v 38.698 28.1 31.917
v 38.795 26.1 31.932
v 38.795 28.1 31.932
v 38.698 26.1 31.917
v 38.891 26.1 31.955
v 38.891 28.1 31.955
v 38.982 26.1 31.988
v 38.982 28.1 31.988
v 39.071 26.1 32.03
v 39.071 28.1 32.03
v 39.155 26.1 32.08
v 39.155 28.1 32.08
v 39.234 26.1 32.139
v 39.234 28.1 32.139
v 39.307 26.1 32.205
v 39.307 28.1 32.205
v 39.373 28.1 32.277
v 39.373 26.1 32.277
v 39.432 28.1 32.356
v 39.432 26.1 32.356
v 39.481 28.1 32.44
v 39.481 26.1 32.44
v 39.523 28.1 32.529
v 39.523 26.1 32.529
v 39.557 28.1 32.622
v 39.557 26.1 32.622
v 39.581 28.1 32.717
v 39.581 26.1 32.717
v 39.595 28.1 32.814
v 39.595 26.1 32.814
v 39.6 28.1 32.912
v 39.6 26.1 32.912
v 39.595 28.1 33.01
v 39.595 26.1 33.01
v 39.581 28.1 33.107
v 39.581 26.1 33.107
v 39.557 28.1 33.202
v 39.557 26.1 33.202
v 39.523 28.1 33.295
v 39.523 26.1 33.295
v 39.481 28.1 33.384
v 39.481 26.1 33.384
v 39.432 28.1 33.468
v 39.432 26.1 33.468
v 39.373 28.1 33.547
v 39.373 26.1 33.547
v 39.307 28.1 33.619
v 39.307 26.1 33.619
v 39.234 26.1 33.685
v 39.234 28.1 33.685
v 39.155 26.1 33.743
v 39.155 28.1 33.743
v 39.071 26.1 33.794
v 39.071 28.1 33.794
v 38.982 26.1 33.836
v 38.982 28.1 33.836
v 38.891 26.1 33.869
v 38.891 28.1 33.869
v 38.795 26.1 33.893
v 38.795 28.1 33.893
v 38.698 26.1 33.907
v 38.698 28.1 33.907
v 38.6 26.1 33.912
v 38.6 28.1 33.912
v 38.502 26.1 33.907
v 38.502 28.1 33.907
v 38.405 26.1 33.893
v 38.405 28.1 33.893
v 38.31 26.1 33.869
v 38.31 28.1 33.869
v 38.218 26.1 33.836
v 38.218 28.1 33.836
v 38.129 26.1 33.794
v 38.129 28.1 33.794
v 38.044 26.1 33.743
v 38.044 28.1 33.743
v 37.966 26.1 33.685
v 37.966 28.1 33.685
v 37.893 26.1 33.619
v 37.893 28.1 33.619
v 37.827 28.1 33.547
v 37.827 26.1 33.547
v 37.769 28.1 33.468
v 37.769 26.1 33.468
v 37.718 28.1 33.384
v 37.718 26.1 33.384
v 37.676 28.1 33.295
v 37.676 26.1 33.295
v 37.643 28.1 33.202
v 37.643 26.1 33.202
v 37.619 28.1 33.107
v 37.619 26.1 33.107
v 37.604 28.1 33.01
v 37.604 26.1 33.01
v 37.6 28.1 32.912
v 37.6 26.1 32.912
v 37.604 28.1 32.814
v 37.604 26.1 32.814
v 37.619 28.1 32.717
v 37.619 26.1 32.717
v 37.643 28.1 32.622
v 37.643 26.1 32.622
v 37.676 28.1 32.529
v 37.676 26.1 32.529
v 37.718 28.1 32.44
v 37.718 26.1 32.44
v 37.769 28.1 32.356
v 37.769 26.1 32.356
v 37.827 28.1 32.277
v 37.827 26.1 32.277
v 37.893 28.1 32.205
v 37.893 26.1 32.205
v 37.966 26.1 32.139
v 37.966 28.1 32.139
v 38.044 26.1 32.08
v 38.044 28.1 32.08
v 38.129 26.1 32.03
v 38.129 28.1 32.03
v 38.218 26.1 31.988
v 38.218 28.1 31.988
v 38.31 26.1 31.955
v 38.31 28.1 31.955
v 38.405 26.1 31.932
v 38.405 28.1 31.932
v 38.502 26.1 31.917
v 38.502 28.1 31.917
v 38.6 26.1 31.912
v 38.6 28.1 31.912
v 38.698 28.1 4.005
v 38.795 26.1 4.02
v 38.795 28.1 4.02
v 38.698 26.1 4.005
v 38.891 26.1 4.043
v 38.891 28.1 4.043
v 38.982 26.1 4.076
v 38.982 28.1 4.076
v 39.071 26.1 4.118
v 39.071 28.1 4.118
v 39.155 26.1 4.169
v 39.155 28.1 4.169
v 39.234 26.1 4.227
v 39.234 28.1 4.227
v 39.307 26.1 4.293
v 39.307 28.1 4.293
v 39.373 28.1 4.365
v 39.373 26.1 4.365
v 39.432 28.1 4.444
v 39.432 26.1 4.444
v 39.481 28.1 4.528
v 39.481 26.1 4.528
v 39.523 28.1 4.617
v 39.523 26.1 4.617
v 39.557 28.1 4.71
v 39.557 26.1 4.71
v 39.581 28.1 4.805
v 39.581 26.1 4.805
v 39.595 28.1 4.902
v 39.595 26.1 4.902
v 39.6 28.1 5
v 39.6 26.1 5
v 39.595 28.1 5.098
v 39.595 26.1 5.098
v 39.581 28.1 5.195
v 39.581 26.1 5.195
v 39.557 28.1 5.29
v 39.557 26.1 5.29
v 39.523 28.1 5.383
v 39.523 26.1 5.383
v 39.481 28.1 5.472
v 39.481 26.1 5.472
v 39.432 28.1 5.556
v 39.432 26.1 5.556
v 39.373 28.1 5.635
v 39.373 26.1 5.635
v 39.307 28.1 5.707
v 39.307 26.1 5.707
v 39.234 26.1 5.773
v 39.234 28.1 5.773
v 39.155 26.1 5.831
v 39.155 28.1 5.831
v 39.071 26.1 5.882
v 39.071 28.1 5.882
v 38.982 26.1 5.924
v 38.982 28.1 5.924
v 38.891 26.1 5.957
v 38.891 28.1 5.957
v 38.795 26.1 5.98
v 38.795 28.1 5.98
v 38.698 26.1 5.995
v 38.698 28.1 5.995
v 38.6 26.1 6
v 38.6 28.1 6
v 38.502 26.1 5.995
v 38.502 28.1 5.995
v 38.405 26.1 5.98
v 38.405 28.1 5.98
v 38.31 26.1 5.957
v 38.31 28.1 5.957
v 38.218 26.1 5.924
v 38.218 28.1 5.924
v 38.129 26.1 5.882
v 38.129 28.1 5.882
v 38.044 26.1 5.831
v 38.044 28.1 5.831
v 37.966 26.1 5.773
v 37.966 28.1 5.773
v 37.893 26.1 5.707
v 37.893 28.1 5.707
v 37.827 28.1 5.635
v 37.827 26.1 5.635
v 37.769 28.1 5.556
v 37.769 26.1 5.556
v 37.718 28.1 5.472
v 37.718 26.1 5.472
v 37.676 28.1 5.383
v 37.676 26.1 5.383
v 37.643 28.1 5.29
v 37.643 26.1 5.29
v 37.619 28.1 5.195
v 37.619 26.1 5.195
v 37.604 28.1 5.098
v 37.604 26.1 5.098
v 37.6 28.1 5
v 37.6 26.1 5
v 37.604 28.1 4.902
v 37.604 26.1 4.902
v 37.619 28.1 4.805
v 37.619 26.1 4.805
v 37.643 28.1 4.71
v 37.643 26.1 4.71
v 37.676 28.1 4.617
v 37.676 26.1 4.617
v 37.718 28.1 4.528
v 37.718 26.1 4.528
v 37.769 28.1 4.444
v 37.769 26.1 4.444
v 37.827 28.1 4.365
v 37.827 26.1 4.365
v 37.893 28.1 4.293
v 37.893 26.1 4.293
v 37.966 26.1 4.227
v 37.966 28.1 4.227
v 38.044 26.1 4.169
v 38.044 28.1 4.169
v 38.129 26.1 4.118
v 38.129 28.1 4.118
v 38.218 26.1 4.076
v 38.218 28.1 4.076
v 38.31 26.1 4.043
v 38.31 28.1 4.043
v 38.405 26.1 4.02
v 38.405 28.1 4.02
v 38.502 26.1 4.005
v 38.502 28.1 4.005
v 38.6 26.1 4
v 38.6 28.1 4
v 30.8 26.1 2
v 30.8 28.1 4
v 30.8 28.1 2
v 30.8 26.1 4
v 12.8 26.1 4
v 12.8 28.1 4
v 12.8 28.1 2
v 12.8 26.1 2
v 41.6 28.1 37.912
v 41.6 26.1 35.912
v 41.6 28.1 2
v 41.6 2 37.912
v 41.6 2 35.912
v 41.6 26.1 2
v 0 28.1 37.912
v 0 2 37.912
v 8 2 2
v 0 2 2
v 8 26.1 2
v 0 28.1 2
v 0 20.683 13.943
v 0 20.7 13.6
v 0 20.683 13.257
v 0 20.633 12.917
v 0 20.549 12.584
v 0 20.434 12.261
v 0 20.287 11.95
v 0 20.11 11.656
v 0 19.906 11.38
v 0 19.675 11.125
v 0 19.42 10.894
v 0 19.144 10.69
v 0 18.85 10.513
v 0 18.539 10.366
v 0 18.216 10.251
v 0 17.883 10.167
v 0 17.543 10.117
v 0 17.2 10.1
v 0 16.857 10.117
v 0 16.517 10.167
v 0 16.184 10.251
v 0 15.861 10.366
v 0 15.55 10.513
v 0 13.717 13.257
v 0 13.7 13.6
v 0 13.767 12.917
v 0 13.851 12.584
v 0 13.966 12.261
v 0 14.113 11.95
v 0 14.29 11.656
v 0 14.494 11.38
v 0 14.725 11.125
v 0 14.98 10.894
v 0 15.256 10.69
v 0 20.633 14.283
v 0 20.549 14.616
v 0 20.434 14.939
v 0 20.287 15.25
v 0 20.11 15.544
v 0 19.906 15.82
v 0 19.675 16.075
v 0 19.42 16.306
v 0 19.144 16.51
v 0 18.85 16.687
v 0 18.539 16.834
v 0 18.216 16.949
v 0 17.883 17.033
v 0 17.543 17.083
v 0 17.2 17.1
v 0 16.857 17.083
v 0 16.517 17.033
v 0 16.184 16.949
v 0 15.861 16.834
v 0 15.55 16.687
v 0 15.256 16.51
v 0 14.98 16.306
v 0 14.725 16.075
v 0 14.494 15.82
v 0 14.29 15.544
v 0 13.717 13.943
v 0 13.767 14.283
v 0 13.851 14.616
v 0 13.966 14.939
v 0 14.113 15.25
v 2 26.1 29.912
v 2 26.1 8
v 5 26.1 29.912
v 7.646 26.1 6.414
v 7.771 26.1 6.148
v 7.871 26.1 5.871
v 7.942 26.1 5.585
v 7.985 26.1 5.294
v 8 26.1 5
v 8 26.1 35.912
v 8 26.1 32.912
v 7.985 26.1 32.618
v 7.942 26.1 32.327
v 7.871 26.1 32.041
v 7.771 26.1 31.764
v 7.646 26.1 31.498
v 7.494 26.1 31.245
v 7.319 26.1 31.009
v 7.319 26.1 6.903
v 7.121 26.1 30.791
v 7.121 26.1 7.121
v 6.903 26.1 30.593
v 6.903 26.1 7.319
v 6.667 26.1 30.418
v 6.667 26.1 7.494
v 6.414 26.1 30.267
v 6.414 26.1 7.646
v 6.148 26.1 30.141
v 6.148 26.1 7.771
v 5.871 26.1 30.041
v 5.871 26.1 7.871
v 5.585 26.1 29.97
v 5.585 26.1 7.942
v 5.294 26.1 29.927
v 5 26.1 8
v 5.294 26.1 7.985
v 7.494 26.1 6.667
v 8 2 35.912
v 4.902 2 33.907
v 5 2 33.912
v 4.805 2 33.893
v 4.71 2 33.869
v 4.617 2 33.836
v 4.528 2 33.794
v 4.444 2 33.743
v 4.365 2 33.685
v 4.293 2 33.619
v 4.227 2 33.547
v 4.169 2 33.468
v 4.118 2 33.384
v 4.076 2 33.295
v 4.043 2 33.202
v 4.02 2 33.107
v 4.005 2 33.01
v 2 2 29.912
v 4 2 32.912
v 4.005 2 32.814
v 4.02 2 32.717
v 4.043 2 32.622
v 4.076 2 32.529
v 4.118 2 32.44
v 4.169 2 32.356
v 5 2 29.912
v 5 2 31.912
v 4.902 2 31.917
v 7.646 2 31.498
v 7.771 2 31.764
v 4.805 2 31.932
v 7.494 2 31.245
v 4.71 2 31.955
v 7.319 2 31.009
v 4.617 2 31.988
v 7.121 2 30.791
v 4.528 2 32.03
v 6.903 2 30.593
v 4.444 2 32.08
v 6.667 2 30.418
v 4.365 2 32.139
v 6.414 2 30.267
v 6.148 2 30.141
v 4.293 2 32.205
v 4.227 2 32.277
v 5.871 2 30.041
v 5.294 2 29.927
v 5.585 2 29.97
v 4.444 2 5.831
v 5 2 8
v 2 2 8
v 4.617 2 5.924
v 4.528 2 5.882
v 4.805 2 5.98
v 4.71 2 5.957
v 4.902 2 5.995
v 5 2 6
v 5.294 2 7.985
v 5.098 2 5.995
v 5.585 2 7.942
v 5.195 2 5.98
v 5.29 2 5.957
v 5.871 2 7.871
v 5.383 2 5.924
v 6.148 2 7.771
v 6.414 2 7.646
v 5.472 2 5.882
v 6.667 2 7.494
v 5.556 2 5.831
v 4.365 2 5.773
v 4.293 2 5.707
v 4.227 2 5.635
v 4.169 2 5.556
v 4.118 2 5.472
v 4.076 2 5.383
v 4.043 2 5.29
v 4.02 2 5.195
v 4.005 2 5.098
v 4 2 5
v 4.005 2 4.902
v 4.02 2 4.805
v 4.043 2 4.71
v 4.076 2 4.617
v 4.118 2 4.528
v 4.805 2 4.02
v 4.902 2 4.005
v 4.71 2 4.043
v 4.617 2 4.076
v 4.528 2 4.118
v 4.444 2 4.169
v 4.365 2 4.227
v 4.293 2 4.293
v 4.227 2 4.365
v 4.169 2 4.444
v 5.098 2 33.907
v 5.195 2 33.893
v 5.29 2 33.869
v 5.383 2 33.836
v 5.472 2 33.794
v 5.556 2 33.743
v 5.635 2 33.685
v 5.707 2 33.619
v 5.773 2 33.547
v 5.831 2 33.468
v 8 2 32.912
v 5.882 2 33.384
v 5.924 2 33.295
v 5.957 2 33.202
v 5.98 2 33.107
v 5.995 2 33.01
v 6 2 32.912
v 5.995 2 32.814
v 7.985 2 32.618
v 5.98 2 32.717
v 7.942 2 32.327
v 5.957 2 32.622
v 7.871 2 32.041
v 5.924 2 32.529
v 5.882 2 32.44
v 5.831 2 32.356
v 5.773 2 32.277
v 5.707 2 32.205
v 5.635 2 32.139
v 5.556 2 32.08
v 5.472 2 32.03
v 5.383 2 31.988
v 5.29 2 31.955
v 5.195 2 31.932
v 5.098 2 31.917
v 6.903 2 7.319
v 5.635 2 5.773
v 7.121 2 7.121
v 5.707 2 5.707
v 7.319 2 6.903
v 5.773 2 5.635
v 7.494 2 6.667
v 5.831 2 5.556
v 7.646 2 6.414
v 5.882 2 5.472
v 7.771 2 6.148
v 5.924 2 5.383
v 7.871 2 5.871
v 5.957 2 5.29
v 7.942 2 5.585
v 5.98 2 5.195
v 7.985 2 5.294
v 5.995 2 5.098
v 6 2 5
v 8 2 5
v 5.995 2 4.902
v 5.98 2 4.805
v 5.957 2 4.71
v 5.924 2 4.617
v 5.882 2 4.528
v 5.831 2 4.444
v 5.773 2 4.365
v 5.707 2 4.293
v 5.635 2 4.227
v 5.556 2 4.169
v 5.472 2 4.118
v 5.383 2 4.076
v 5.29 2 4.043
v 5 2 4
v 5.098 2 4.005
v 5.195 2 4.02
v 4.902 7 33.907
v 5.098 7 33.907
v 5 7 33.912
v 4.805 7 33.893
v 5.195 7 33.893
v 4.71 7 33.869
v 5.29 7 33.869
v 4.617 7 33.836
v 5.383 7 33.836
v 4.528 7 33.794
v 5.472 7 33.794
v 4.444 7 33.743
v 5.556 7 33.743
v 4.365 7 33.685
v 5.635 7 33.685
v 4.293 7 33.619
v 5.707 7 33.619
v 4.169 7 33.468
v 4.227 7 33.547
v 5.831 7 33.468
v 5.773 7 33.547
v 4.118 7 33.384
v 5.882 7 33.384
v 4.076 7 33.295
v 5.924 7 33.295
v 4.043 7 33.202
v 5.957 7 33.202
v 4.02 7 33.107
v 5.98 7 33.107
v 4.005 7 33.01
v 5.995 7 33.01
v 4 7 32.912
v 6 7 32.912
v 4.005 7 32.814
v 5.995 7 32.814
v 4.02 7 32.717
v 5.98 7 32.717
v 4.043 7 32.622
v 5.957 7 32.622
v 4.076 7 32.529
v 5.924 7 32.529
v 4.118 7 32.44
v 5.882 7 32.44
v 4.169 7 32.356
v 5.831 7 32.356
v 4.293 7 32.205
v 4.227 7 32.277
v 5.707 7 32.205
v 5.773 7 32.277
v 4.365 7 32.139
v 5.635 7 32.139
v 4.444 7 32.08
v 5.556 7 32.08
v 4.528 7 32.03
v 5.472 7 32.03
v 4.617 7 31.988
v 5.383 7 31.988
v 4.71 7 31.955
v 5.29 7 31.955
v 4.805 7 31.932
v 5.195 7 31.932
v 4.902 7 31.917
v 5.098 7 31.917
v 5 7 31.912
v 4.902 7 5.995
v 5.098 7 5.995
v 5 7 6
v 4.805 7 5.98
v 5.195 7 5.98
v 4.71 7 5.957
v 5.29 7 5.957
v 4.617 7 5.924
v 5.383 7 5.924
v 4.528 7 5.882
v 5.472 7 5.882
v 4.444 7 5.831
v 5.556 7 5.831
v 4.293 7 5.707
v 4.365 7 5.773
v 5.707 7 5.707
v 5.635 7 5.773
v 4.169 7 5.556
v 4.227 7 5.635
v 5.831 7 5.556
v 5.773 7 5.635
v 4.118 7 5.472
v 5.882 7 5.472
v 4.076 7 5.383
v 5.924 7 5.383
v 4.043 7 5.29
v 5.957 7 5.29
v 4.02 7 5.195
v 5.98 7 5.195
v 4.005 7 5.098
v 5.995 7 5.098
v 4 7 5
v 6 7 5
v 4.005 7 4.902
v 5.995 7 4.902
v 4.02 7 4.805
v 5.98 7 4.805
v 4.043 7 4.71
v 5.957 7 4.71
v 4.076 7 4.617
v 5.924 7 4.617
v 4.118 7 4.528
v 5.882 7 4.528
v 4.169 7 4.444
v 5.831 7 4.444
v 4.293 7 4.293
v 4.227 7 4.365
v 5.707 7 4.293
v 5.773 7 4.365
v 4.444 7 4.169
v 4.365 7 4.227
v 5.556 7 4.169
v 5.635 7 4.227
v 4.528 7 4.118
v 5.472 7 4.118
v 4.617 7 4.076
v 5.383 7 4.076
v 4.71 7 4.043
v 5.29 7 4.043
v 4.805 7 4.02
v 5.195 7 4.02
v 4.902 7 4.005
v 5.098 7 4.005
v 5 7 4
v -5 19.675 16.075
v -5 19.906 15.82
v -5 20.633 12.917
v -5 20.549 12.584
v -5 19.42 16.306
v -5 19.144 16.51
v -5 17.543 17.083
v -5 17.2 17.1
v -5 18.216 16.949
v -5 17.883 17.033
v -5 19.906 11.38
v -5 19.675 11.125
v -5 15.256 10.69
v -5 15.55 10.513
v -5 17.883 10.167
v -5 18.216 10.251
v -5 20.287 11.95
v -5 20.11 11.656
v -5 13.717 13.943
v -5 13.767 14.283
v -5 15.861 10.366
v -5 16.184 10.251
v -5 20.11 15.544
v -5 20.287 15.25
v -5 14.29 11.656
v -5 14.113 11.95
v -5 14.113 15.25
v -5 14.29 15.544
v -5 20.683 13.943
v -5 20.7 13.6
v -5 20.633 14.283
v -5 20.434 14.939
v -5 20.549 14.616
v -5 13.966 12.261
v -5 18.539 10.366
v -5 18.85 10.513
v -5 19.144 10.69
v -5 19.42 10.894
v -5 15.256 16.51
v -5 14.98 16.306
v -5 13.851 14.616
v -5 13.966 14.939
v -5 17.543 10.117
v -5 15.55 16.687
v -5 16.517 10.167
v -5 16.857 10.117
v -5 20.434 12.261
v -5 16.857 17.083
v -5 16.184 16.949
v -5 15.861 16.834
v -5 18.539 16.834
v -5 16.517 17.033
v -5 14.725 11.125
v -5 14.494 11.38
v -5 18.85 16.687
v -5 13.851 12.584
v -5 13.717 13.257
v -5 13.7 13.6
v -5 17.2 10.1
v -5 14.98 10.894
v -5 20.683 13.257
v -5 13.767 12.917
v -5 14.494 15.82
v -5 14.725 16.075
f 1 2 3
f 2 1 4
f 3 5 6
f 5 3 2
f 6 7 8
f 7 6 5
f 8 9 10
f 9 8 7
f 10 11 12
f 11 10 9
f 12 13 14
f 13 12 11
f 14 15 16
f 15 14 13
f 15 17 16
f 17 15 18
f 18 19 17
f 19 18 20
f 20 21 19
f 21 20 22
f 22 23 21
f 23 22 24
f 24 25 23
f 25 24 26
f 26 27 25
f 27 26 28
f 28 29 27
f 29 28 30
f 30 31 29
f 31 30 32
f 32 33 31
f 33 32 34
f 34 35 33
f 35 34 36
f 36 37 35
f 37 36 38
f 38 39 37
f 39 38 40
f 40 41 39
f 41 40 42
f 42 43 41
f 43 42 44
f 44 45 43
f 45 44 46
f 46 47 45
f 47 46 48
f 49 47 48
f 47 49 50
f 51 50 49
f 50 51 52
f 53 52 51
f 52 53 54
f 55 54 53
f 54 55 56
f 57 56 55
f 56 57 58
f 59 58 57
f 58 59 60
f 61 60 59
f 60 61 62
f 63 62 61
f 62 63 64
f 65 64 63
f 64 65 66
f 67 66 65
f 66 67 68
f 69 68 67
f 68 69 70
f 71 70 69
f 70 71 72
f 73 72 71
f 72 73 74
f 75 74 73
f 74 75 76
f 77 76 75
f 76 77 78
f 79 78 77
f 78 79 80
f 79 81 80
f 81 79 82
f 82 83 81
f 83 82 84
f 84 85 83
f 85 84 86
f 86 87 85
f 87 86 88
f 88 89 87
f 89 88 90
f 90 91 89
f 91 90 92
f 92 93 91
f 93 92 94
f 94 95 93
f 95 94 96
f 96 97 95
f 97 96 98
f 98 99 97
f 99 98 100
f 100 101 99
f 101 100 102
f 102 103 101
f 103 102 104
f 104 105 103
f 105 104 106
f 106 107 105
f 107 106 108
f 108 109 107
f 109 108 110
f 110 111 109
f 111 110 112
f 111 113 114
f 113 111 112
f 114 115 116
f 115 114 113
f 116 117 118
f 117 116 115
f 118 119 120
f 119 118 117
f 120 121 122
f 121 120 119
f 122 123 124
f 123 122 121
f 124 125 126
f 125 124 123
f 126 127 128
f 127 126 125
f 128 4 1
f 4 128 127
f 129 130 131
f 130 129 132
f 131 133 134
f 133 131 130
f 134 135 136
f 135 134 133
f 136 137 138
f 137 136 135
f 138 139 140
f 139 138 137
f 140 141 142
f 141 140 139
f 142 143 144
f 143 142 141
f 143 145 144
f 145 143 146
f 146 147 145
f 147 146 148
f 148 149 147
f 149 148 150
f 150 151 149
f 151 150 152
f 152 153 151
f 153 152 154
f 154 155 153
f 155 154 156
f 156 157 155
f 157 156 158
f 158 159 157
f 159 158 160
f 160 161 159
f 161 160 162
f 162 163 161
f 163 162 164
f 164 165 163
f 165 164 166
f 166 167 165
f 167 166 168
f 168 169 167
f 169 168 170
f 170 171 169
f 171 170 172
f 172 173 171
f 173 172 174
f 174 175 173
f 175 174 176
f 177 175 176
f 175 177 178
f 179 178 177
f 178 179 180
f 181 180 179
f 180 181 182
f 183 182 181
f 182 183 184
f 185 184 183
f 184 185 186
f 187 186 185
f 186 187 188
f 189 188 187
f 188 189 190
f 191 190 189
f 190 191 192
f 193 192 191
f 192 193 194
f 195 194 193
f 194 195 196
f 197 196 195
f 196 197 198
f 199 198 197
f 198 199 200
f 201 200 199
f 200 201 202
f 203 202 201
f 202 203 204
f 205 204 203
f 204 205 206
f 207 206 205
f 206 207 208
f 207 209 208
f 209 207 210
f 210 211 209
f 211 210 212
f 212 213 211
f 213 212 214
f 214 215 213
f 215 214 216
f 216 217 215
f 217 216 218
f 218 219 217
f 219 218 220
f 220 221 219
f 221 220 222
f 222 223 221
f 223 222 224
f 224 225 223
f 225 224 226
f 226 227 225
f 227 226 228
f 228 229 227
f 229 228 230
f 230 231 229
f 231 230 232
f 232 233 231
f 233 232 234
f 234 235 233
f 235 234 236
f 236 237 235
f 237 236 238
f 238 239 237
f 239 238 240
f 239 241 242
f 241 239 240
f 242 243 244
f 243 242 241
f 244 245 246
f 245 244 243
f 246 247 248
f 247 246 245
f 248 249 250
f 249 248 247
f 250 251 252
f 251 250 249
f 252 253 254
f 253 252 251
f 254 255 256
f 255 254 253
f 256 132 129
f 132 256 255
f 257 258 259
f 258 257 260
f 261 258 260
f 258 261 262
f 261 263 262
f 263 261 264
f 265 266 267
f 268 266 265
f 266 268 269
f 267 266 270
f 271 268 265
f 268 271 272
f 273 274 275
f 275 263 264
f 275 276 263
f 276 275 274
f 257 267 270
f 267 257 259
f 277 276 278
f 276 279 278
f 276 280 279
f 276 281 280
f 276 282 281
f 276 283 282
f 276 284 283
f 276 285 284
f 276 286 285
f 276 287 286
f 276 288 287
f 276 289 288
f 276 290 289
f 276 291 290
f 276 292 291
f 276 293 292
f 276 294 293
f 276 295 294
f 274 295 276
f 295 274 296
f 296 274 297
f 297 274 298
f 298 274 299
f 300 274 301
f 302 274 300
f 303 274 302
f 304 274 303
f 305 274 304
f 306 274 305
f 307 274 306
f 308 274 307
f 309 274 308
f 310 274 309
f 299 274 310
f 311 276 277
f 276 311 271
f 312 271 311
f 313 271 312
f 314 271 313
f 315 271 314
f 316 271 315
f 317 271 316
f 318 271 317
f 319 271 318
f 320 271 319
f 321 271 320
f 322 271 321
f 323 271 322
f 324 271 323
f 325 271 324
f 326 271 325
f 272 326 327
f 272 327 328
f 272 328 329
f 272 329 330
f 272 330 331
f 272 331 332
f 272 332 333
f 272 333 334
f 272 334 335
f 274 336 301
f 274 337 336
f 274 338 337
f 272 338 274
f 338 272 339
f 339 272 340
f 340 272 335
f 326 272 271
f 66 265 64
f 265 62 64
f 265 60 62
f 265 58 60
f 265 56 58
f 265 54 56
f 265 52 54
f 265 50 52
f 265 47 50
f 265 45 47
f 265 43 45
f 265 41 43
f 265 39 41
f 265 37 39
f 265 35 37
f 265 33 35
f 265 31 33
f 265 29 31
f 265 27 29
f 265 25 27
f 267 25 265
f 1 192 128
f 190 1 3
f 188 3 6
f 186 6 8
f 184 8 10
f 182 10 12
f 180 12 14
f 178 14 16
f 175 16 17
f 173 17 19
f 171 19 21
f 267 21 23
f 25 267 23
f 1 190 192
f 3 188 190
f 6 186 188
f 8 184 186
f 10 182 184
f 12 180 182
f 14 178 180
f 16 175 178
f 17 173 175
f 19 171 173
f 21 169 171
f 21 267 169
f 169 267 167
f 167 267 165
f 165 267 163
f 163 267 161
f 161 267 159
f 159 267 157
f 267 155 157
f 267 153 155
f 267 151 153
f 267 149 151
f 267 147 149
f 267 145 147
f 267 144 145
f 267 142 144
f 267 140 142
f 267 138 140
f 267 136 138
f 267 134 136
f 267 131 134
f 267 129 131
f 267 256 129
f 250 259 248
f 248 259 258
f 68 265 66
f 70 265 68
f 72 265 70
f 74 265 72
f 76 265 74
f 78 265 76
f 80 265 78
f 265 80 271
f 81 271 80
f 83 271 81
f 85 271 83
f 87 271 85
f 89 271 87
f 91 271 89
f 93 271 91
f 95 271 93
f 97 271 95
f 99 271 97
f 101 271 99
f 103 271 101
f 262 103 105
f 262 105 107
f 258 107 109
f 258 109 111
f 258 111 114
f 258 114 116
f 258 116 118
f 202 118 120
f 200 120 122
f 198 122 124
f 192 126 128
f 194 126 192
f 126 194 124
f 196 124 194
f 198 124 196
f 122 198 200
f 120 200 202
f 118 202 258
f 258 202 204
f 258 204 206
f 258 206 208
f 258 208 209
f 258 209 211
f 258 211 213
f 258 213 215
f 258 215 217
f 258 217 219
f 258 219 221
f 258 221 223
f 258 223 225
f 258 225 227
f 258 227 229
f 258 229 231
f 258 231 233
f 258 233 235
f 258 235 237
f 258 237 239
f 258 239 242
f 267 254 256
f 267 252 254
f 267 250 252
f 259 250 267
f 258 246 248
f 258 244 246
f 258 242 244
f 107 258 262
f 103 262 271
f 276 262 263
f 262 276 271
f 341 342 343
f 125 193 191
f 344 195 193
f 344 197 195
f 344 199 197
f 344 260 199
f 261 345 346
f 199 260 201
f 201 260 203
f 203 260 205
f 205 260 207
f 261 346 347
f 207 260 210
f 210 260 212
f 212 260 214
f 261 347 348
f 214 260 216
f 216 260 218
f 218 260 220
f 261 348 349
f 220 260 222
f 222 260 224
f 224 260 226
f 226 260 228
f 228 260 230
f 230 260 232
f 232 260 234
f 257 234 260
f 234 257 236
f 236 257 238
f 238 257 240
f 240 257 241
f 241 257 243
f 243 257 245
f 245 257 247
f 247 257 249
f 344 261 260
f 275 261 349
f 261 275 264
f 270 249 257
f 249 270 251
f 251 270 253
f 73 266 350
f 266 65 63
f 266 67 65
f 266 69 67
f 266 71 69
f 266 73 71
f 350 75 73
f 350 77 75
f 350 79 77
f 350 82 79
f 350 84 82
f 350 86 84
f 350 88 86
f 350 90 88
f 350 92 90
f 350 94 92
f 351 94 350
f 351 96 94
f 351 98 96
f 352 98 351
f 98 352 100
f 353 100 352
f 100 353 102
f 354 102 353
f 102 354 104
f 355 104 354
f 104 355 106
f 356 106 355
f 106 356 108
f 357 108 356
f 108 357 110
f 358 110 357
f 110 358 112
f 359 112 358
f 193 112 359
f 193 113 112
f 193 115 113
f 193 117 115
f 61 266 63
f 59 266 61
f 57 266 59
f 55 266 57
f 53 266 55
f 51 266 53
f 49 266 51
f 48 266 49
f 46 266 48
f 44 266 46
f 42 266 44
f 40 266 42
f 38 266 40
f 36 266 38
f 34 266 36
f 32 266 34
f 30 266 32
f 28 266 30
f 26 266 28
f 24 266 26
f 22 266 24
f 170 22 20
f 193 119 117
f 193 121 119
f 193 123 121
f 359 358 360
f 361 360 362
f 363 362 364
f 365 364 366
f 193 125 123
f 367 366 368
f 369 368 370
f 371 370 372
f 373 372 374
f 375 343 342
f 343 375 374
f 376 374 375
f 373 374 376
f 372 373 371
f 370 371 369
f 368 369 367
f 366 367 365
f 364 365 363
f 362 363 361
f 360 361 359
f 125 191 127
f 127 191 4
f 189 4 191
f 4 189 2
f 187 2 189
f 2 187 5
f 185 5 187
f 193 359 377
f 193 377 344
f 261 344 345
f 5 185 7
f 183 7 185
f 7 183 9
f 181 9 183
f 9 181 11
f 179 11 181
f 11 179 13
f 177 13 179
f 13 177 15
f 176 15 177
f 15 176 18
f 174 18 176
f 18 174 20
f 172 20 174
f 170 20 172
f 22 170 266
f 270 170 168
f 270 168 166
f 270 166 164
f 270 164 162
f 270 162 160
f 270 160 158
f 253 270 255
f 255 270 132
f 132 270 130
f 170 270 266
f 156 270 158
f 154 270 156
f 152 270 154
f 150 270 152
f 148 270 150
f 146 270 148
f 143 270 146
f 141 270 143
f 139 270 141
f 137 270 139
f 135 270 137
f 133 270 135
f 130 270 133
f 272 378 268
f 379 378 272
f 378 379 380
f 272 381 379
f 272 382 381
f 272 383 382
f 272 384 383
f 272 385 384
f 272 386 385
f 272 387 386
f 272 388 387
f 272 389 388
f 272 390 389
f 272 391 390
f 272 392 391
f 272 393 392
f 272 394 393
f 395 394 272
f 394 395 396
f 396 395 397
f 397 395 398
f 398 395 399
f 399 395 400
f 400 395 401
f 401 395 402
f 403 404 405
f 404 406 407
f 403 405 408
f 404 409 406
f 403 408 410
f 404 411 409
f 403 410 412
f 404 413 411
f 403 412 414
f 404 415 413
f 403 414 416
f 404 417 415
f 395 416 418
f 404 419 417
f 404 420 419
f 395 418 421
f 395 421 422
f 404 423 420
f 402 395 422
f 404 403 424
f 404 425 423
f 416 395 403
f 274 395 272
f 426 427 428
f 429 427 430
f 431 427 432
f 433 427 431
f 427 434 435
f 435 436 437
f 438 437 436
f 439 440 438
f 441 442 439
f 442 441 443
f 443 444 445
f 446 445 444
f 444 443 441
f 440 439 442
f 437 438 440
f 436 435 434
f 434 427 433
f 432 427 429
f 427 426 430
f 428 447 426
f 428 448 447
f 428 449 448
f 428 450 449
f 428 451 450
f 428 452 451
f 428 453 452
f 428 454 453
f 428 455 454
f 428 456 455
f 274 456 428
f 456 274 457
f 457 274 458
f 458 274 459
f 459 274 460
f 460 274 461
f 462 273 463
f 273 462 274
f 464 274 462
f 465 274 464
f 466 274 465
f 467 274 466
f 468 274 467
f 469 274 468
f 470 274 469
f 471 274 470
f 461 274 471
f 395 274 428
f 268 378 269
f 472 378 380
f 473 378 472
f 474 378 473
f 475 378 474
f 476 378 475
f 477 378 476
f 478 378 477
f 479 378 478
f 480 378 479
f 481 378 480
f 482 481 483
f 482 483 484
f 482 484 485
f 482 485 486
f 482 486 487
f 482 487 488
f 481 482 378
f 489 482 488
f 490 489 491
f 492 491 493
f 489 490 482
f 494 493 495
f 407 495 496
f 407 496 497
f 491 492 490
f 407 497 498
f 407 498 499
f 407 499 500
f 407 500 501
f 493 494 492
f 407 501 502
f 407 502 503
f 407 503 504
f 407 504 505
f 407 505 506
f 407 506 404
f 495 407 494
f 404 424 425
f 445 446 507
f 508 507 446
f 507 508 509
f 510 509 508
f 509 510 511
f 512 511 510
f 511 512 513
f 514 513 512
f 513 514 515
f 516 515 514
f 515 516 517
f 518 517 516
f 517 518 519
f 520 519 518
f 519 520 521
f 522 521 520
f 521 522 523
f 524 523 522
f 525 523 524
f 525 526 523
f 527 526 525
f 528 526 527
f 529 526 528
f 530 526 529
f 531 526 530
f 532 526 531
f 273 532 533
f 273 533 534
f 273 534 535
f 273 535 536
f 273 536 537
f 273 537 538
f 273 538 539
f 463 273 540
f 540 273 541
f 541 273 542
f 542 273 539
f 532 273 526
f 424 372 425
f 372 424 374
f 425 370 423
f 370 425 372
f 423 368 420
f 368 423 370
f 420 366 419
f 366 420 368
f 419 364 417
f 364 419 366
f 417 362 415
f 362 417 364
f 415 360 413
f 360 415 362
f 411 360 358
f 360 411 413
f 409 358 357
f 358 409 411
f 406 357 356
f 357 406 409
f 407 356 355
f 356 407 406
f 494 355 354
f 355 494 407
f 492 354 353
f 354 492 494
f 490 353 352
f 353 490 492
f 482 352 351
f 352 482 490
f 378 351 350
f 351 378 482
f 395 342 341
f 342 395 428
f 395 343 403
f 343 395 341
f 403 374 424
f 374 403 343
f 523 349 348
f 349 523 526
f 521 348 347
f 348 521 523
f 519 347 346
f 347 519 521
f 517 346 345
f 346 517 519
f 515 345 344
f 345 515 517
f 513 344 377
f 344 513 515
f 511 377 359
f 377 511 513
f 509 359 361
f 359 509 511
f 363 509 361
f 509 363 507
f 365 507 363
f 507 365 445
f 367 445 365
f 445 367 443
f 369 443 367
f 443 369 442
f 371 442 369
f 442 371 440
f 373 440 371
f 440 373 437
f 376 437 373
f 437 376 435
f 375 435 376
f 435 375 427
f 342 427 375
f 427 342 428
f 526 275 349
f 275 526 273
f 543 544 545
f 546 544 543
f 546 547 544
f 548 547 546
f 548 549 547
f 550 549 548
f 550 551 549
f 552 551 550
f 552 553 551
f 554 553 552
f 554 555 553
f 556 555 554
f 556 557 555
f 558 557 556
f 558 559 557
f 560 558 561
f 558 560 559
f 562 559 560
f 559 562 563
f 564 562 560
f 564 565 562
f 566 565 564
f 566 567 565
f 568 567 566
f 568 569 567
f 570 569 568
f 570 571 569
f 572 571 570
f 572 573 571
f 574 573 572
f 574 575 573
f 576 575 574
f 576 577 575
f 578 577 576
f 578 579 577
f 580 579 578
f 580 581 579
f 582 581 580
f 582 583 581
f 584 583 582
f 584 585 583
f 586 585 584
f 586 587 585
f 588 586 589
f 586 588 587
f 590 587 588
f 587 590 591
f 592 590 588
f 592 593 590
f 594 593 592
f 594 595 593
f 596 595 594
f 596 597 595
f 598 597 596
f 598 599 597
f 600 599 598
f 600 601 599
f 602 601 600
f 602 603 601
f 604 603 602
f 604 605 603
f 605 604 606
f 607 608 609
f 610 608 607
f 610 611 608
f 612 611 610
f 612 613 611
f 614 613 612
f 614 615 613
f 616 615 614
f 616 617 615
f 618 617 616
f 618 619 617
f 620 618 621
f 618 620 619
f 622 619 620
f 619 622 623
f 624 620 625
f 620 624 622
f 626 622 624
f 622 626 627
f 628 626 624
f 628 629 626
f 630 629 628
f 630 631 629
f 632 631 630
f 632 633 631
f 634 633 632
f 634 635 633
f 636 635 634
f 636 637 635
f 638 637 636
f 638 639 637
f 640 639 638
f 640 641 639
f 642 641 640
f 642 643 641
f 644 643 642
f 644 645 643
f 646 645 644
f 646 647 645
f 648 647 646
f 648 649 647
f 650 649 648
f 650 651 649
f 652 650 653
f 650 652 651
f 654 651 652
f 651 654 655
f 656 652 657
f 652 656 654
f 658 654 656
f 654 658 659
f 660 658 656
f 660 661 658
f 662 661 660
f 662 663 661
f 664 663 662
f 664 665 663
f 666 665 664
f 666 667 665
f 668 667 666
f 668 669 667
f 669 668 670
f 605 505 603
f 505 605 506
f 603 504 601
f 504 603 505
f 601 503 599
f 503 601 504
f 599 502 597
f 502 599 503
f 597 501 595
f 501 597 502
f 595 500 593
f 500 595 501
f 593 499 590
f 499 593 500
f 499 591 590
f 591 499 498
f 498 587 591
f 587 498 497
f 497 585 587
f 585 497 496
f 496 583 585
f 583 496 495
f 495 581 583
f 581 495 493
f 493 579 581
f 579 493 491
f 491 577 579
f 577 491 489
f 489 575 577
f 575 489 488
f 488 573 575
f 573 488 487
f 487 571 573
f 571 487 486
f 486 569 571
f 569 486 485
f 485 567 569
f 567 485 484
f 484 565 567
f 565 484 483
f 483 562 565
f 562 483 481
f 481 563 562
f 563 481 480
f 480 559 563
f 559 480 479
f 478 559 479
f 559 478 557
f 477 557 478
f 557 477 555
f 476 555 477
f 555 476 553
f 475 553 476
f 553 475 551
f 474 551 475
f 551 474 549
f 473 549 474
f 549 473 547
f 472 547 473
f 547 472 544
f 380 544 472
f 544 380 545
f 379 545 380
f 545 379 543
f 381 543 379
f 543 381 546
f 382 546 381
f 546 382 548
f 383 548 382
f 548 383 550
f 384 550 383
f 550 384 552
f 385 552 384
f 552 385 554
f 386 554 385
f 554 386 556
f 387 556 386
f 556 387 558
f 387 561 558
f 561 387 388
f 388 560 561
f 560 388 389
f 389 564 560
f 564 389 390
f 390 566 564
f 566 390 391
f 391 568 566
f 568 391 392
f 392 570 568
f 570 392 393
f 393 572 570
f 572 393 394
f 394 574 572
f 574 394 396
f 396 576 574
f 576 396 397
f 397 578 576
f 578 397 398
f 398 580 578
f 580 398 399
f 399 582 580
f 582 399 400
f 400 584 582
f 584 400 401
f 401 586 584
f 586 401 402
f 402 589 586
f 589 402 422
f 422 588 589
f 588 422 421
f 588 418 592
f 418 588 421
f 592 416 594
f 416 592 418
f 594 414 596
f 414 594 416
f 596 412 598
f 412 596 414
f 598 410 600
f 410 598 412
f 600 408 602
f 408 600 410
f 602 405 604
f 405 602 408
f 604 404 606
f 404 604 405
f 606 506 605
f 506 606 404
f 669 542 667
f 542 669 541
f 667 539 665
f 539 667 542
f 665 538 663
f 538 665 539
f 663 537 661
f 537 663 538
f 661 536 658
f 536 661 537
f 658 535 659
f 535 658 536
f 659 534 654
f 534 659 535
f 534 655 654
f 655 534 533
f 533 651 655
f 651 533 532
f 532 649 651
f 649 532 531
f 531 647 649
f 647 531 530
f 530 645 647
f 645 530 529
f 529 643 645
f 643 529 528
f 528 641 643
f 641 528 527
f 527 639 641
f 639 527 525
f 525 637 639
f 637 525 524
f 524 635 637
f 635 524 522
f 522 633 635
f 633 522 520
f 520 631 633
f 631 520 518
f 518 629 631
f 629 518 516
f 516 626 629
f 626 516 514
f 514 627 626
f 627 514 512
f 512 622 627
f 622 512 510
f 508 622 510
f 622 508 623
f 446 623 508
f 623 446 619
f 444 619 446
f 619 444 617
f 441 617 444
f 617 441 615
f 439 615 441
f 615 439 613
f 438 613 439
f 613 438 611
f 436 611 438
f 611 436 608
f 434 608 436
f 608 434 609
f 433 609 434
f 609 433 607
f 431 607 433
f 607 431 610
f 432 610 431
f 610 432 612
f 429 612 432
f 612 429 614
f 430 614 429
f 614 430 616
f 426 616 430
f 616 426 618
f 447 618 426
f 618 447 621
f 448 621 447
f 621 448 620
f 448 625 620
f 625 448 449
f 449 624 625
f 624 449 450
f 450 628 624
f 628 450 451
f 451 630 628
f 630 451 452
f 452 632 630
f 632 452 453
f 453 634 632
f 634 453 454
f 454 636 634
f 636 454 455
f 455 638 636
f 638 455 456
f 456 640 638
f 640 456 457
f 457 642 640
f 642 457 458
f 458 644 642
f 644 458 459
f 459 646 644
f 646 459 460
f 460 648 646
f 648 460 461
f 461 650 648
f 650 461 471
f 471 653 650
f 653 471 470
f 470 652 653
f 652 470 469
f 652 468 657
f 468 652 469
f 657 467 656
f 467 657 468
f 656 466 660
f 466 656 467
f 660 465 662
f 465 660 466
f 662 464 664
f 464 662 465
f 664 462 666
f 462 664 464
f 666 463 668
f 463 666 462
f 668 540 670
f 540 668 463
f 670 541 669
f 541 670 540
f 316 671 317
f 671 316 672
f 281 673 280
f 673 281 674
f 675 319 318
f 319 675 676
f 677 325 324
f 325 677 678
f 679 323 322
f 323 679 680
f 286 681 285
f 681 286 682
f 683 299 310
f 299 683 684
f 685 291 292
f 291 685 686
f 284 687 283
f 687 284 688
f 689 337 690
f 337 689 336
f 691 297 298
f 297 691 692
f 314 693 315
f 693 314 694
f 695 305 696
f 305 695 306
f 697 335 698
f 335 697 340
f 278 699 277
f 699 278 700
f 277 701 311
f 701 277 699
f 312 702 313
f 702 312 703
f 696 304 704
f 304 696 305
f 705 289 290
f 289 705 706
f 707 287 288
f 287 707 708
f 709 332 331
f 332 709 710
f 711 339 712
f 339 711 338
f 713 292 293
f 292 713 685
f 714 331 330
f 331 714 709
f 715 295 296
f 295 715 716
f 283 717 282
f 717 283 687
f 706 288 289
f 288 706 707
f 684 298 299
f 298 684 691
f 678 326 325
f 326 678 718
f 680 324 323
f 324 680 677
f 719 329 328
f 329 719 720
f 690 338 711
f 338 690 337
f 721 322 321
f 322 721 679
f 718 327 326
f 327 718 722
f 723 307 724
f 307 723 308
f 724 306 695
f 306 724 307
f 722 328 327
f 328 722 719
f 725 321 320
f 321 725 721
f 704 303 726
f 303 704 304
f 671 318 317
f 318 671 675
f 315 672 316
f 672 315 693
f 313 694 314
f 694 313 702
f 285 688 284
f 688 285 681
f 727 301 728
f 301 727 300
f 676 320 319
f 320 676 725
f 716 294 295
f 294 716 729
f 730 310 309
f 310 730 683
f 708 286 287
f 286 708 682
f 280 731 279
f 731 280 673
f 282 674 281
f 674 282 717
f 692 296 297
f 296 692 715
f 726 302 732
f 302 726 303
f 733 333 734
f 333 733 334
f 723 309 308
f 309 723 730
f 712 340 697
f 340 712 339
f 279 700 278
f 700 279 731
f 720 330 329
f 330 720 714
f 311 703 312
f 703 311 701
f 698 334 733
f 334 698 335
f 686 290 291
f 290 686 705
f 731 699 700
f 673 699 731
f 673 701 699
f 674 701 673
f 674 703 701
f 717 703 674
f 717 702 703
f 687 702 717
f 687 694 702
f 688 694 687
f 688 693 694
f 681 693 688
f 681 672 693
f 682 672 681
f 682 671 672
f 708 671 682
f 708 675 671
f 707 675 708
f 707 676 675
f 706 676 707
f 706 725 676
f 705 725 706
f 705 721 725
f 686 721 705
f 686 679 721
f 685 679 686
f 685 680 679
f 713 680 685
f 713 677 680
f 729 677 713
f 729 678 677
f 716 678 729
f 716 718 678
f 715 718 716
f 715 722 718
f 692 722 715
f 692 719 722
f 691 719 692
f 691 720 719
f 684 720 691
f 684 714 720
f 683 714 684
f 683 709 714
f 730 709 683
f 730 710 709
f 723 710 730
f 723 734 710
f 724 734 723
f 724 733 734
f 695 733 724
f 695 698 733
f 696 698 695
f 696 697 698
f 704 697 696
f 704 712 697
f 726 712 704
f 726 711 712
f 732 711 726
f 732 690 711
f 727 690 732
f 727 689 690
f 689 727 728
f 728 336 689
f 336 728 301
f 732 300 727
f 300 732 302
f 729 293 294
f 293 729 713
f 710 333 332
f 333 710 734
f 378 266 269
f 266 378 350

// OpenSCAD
// Outer width of the "box" that contains the camera
BODY_OUT_X = 43.6;
BODY_OUT_Y = 28.1;
BODY_OUT_Z = 37.912;

// Thickness of the walls of the "box" that contains the camera
PANEL_THICK = 2;

// Margin to apply when performing differences
MARGIN = 1;

// Circles resolution
FN = 64;

// Cable hole dimensions
CABLE_HOLE_W = 18;
CABLE_HOLE_H = 2;

// Axis dimensions
AXIS_H = 5;
AXIS_R = 3.5;
AXIS_Z = 13.6;
AXIS_Y = 17.2;

SCREWS_DEEP = 5;

// Back panel
difference () {
translate ([0, BODY_OUT_Y - PANEL_THICK, PANEL_THICK]) {
    cube([BODY_OUT_X - PANEL_THICK, PANEL_THICK, BODY_OUT_Z - PANEL_THICK]);
}
union () {
translate ([0, BODY_OUT_Y + MARGIN, 0]) {
rotate ([90, 0, 0]) {
linear_extrude(height = PANEL_THICK + MARGIN * 2) {
    import(file = "../drawings/camera.dxf", layer = "openscad-servo-screws", $fn=FN);
}
}
}
translate ([BODY_OUT_X / 2 - CABLE_HOLE_W / 2, BODY_OUT_Y - PANEL_THICK - MARGIN, PANEL_THICK - MARGIN]) {
cube ([CABLE_HOLE_W, PANEL_THICK + MARGIN * 2, CABLE_HOLE_H + MARGIN]);
}
}
}

// Left panel
translate ([0, PANEL_THICK, PANEL_THICK]) {
    cube([PANEL_THICK, BODY_OUT_Y - PANEL_THICK, BODY_OUT_Z - PANEL_THICK]);
}
translate ([MARGIN, AXIS_Y, AXIS_Z]) {
rotate ([0, -90, 0]) {
cylinder (AXIS_H + MARGIN, AXIS_R, AXIS_R, $fn=FN);
}
}

// Top panel
translate ([0, PANEL_THICK, BODY_OUT_Z - PANEL_THICK]) {
cube([BODY_OUT_X - PANEL_THICK, BODY_OUT_Y - PANEL_THICK, PANEL_THICK]);
}

// Screws to front
difference () {
translate ([0, BODY_OUT_Y, 0]) {
rotate ([90, 0, 0]) {
linear_extrude(height = BODY_OUT_Y - PANEL_THICK) {
    import(file = "../drawings/camera.dxf", layer = "openscad-screws", $fn=FN);
}
}
}

translate ([0, SCREWS_DEEP + PANEL_THICK, 0]) {
rotate ([90, 0, 0]) {
linear_extrude(height = SCREWS_DEEP + MARGIN) {
            import(file = "../drawings/camera.dxf", layer = "openscad-base-screws", $fn=FN);
    }
}
}
}
